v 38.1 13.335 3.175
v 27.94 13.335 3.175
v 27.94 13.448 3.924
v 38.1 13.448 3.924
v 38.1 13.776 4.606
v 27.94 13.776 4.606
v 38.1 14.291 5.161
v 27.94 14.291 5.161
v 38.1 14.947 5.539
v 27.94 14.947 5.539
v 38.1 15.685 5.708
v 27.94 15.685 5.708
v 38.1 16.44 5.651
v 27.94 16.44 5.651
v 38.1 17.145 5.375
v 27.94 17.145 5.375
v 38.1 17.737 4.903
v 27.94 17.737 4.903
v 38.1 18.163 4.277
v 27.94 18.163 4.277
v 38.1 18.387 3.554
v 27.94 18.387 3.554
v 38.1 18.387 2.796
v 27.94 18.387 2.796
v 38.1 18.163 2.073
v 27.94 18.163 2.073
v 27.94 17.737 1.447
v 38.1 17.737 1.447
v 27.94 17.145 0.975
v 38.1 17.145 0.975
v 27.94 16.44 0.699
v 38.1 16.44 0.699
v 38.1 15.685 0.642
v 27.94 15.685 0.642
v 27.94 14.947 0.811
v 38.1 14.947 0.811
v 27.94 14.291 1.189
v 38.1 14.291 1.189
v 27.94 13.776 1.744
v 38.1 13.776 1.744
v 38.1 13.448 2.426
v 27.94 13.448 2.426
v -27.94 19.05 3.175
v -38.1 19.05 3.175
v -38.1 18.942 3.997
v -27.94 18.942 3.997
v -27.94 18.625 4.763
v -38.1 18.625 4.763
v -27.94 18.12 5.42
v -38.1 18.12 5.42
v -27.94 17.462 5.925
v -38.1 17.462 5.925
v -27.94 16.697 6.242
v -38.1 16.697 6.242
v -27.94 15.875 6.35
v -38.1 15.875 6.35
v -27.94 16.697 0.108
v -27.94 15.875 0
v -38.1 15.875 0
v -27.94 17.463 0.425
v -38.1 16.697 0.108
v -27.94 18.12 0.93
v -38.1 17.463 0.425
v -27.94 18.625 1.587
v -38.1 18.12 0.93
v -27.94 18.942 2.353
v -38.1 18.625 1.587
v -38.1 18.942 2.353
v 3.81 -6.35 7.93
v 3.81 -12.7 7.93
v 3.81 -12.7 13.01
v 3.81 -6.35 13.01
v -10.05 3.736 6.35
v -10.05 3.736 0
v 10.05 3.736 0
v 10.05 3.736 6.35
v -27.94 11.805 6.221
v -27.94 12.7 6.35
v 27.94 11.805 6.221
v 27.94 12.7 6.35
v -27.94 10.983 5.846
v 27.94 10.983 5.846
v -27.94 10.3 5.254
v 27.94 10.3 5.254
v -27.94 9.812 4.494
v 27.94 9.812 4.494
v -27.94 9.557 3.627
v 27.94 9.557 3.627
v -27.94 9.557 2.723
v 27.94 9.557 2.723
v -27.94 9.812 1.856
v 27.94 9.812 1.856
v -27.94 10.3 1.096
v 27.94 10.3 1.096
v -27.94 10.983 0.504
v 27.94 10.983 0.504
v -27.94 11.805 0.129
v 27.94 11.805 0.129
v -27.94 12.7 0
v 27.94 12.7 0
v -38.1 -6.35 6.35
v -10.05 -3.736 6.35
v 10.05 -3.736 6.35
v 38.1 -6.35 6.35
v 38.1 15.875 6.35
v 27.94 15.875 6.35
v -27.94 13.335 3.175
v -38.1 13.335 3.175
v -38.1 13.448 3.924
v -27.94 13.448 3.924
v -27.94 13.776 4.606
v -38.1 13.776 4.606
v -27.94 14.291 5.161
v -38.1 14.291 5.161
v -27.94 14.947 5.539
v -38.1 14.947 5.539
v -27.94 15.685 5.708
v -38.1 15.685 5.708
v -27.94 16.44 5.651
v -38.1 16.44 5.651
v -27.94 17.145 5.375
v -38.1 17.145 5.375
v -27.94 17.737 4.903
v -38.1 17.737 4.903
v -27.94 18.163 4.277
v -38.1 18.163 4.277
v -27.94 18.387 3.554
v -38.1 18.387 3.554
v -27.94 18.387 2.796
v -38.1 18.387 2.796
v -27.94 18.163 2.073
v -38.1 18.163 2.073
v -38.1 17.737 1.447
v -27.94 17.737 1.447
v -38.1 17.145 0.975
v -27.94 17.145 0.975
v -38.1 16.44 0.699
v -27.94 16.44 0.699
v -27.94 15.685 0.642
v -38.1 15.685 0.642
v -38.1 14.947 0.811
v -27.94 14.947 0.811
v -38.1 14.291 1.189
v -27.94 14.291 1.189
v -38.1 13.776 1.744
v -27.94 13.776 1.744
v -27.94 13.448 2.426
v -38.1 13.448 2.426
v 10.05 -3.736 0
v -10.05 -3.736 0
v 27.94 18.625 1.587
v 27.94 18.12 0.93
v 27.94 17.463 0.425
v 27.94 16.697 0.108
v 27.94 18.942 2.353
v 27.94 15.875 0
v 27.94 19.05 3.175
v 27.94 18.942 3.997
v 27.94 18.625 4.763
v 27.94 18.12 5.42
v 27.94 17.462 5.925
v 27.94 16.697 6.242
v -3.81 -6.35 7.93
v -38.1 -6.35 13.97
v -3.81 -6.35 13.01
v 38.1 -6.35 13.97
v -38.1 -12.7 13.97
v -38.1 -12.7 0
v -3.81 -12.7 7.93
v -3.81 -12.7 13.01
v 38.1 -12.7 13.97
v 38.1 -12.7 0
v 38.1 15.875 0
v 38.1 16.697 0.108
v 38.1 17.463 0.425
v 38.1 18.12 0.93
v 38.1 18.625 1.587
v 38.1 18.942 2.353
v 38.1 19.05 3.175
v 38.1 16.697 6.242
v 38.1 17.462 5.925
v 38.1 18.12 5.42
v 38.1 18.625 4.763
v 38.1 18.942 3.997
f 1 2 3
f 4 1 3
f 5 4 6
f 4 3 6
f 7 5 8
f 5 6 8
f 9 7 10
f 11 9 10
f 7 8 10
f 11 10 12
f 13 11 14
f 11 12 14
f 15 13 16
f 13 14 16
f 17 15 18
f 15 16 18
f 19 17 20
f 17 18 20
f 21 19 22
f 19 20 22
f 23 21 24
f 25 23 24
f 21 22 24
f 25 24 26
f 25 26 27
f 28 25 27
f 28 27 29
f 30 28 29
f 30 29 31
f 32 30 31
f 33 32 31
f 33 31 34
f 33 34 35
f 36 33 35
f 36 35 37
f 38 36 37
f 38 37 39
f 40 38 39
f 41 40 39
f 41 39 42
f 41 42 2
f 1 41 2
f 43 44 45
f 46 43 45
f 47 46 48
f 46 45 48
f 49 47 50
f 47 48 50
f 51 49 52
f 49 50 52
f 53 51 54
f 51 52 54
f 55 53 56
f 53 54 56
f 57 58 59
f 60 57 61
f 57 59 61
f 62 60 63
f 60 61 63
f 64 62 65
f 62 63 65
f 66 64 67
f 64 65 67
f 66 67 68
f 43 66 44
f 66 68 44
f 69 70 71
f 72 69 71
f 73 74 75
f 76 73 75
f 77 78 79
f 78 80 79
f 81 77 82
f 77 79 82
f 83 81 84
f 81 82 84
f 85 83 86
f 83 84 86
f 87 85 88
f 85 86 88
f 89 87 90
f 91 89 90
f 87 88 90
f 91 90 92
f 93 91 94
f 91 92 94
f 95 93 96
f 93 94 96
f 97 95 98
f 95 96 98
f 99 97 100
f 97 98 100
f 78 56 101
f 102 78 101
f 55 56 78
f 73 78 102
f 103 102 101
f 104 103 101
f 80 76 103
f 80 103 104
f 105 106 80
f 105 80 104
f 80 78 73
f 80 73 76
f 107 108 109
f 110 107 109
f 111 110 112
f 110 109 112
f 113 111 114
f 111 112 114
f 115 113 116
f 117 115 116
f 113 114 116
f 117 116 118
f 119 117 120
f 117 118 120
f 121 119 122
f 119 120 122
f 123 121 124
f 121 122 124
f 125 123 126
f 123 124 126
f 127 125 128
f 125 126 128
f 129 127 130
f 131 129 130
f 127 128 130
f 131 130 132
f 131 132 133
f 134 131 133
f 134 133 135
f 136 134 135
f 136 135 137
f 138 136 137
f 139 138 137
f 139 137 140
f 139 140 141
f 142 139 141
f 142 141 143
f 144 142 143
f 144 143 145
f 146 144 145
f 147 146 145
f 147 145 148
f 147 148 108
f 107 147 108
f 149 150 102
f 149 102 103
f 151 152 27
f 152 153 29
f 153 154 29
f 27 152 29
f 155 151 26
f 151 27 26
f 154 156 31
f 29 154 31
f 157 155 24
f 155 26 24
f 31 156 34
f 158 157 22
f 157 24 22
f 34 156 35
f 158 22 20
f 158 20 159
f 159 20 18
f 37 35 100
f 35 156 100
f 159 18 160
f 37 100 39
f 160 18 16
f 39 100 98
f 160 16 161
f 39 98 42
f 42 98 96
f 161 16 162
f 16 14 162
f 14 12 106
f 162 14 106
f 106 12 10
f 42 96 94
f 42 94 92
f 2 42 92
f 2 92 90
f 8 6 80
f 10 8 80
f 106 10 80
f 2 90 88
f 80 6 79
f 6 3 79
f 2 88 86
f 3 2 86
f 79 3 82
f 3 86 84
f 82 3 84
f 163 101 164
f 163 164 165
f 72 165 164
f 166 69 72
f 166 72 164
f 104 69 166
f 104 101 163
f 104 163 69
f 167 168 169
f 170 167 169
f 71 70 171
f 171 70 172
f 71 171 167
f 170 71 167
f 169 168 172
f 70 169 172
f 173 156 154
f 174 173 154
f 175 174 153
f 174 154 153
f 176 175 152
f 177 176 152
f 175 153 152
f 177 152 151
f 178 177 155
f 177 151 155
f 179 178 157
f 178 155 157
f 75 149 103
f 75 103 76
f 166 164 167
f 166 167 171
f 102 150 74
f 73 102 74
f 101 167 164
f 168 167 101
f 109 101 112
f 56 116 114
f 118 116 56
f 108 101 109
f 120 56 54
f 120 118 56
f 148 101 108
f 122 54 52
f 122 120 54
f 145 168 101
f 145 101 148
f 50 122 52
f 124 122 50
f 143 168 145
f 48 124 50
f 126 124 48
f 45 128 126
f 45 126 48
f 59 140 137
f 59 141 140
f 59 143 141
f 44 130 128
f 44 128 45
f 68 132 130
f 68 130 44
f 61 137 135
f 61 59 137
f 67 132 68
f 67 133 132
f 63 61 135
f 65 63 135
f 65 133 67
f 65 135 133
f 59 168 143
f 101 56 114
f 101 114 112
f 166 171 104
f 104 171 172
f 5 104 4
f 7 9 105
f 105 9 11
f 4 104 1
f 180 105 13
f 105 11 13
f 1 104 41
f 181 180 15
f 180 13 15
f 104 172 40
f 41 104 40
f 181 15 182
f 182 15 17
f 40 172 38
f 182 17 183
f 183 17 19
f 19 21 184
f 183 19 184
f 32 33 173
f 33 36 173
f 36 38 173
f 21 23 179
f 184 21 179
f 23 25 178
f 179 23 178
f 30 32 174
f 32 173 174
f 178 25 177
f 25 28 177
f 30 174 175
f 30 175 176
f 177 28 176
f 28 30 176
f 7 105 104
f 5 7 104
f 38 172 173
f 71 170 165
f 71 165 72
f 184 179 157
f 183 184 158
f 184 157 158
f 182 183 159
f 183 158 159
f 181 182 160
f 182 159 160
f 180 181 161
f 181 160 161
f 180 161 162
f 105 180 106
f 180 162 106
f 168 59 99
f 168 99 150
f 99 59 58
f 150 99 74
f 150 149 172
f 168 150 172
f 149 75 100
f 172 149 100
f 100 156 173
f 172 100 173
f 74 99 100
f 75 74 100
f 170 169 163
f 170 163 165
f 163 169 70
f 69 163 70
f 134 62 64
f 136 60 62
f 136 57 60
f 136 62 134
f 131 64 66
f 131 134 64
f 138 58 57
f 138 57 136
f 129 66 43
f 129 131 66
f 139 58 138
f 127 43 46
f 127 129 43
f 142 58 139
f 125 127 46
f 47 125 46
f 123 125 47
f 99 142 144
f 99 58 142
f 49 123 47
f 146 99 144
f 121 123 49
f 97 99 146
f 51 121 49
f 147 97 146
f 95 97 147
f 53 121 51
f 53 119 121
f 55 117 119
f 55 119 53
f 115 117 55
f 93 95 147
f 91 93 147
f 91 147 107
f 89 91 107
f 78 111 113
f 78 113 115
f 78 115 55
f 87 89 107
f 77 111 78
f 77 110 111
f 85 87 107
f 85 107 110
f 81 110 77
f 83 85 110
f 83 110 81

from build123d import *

# Parameters (mm, degrees)
F0_W      = 76.2
F0_H      = 25.4
F2_DEPTH  = 6.35
F1_W      = 20.0991295278
F1_H      = 7.4727535248
F3_DEPTH  = 6.35
F4_W      = 10.16
F4_H      = 6.35
F5_DEPTH  = 19.05
F6_R      = 2.54
F7_DEPTH  = 76.2
F8_DEPTH  = 76.2
F10_DEPTH = 27.94
F11_W     = 76.2
F11_H     = 6.35
F12_DEPTH = 13.97
F13_W     = 7.62
F13_H     = 5.08
F14_DEPTH = 25.4
F15_DEPTH = 190.5


with BuildPart() as f2:
    # F0 (on Top) → F2 (new body)
    with BuildSketch(Plane.XY):
        Rectangle(F0_W, F0_H)
    extrude(amount=F2_DEPTH)

    # F1 (on Top) → F3 (cut)
    with BuildSketch(Plane.XY):
        Rectangle(F1_W, F1_H)
    extrude(amount=F3_DEPTH, mode=Mode.SUBTRACT)

    # F4 (on Front) → F5 (join)
    with BuildSketch(Plane.XZ):
        with Locations((33.02, 3.175)):
            Rectangle(F4_W, F4_H)
        with Locations((-33.02, 3.175)):
            Rectangle(F4_W, F4_H)
    extrude(amount=-F5_DEPTH)

    # F6 (on face) → F7 (cut)
    with BuildSketch(Plane(origin=(-38.1, 0, 0), x_dir=(0, -1, 0), z_dir=(-1, 0, 0))):
        with Locations((-15.875, 3.175)):
            Circle(F6_R)
    extrude(amount=-F7_DEPTH, mode=Mode.SUBTRACT)

    # F6 (on face) → F8 (cut)
    with BuildSketch(Plane(origin=(-38.1, 0, 0), x_dir=(0, -1, 0), z_dir=(-1, 0, 0))):
        with BuildLine():
            Line((-19.05, 0), (-15.875, 0))
            ThreePointArc((-15.875, 0), (-18.1200640303, 0.9299359697), (-19.05, 3.175))
            Line((-19.05, 3.175), (-19.05, 0))
        make_face()
        with BuildLine():
            ThreePointArc((-19.05, 3.175), (-18.1200640229, 5.4200640376), (-15.8749999792, 6.35))
            Line((-15.8749999792, 6.35), (-19.05, 6.35))
            Line((-19.05, 6.35), (-19.05, 3.175))
        make_face()
    extrude(amount=-F8_DEPTH, mode=Mode.SUBTRACT)

    # F9 (on Right) → F10 (cut, symmetric)
    with BuildSketch(Plane.YZ):
        with BuildLine():
            ThreePointArc((12.7, 6.35), (9.525, 3.175), (12.7, 0))
            Line((12.7, 0), (12.7, 6.35))
        make_face()
    extrude(amount=F10_DEPTH, both=True, mode=Mode.SUBTRACT)

    # F11 (on Top) → F12 (join)
    with BuildSketch(Plane.XY):
        with Locations((0, -9.525)):
            Rectangle(F11_W, F11_H)
    extrude(amount=F12_DEPTH)

    # F13 (on face) → F14 (join)
    with BuildSketch(Plane.XZ.offset(12.7)):
        with Locations((0, 10.4701574892)):
            Rectangle(F13_W, F13_H)
    extrude(amount=F14_DEPTH)

    # F15 (cut, symmetric): a face of the model
    f15_faces = [f2.faces().sort_by_distance(p)[0] for p in [
        (0, -38.1, 10.4701574892),
    ]]
    extrude(f15_faces, amount=F15_DEPTH, both=True, mode=Mode.SUBTRACT)


solid = f2.part
